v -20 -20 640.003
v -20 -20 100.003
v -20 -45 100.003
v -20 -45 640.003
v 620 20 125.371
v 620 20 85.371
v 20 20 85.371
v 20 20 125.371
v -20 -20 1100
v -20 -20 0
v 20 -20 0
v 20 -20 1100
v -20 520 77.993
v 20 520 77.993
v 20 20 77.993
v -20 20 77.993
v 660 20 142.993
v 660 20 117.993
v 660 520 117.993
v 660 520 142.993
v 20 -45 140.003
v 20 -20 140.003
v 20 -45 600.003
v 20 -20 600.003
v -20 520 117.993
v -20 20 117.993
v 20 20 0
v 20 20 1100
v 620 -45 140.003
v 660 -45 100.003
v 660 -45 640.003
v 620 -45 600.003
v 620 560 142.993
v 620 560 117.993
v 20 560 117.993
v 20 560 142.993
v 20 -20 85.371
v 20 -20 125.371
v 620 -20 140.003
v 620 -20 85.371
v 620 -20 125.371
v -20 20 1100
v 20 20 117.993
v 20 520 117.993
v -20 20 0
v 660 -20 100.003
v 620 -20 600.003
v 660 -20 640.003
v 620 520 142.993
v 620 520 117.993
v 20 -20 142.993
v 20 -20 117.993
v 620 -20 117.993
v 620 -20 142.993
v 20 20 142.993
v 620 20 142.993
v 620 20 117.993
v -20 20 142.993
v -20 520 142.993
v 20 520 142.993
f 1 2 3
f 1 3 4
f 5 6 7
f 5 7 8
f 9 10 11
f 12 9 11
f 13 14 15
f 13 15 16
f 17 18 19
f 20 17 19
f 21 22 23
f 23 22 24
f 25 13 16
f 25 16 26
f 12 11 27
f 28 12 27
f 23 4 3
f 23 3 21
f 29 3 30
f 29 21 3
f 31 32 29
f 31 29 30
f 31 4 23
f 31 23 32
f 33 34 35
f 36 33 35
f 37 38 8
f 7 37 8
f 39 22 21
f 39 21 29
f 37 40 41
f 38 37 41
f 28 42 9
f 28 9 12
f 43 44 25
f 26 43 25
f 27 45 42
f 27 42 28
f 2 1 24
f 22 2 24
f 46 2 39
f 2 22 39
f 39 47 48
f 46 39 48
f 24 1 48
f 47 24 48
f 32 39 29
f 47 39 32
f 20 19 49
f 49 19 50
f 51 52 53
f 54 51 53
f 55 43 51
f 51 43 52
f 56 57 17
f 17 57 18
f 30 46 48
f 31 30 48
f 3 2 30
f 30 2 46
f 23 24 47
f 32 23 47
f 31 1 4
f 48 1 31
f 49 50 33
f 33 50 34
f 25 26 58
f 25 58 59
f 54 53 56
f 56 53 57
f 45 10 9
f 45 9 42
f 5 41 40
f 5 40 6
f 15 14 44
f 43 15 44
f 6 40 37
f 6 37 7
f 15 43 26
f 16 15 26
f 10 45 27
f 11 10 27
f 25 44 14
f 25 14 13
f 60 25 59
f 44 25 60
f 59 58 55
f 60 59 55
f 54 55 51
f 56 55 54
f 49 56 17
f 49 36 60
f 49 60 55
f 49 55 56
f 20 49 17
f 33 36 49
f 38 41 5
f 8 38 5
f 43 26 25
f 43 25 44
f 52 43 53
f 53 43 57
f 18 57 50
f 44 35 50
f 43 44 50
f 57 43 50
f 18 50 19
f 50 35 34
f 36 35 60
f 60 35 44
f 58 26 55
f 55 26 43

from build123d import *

# Parameters (mm, degrees)
F0_W     = 40
F0_H     = 40
F1_DEPTH = 1100
F2_W     = 40
F2_H     = 40
F3_DEPTH = 600
F4_W     = 40
F4_H     = 40
F5_DEPTH = 500
F6_W     = 40
F6_H     = 500
F7_DEPTH = 25
F8_W     = 680
F8_H     = 540
F8_W_2   = 600
F8_H_2   = 460
F9_DEPTH = 25


with BuildPart() as f1:
    # F0 (on Top) → F1 (new body)
    with BuildSketch(Plane.XY):
        Rectangle(F0_W, F0_H)
    extrude(amount=F1_DEPTH)


with BuildPart() as f3:
    # F2 (on face) → F3 (new body)
    with BuildSketch(Plane.YZ.offset(20)):
        with Locations((0, 105.371441)):
            Rectangle(F2_W, F2_H)
    extrude(amount=F3_DEPTH)


with BuildPart() as f5:
    # F4 (on face) → F5 (new body)
    with BuildSketch(Plane(origin=(0, 20, 0), x_dir=(-1, 0, 0), z_dir=(0, 1, 0))):
        with Locations((0, 97.993489)):
            Rectangle(F4_W, F4_H)
    extrude(amount=F5_DEPTH)


with BuildPart() as f7:
    # F6 (on face) → F7 (new body)
    with BuildSketch(Plane.XY.offset(117.993489)):
        with Locations((0, 270)):
            Rectangle(F6_W, F6_H)
        Polygon((20, 20), (20, -20), (620, -20), (620, 20), (660, 20), (660, 520), (620, 520), (620, 560), (20, 560), (20, 520), align=None)
    extrude(amount=F7_DEPTH)


with BuildPart() as f9:
    # F8 (on face) → F9 (new body)
    with BuildSketch(Plane.XZ.offset(20)):
        with Locations((320, 370.002818)):
            Rectangle(F8_W, F8_H)
        with Locations((320, 370.002818)):
            Rectangle(F8_W_2, F8_H_2, mode=Mode.SUBTRACT)
    extrude(amount=F9_DEPTH)


solid = Compound([f1.part, f3.part, f5.part, f7.part, f9.part])
